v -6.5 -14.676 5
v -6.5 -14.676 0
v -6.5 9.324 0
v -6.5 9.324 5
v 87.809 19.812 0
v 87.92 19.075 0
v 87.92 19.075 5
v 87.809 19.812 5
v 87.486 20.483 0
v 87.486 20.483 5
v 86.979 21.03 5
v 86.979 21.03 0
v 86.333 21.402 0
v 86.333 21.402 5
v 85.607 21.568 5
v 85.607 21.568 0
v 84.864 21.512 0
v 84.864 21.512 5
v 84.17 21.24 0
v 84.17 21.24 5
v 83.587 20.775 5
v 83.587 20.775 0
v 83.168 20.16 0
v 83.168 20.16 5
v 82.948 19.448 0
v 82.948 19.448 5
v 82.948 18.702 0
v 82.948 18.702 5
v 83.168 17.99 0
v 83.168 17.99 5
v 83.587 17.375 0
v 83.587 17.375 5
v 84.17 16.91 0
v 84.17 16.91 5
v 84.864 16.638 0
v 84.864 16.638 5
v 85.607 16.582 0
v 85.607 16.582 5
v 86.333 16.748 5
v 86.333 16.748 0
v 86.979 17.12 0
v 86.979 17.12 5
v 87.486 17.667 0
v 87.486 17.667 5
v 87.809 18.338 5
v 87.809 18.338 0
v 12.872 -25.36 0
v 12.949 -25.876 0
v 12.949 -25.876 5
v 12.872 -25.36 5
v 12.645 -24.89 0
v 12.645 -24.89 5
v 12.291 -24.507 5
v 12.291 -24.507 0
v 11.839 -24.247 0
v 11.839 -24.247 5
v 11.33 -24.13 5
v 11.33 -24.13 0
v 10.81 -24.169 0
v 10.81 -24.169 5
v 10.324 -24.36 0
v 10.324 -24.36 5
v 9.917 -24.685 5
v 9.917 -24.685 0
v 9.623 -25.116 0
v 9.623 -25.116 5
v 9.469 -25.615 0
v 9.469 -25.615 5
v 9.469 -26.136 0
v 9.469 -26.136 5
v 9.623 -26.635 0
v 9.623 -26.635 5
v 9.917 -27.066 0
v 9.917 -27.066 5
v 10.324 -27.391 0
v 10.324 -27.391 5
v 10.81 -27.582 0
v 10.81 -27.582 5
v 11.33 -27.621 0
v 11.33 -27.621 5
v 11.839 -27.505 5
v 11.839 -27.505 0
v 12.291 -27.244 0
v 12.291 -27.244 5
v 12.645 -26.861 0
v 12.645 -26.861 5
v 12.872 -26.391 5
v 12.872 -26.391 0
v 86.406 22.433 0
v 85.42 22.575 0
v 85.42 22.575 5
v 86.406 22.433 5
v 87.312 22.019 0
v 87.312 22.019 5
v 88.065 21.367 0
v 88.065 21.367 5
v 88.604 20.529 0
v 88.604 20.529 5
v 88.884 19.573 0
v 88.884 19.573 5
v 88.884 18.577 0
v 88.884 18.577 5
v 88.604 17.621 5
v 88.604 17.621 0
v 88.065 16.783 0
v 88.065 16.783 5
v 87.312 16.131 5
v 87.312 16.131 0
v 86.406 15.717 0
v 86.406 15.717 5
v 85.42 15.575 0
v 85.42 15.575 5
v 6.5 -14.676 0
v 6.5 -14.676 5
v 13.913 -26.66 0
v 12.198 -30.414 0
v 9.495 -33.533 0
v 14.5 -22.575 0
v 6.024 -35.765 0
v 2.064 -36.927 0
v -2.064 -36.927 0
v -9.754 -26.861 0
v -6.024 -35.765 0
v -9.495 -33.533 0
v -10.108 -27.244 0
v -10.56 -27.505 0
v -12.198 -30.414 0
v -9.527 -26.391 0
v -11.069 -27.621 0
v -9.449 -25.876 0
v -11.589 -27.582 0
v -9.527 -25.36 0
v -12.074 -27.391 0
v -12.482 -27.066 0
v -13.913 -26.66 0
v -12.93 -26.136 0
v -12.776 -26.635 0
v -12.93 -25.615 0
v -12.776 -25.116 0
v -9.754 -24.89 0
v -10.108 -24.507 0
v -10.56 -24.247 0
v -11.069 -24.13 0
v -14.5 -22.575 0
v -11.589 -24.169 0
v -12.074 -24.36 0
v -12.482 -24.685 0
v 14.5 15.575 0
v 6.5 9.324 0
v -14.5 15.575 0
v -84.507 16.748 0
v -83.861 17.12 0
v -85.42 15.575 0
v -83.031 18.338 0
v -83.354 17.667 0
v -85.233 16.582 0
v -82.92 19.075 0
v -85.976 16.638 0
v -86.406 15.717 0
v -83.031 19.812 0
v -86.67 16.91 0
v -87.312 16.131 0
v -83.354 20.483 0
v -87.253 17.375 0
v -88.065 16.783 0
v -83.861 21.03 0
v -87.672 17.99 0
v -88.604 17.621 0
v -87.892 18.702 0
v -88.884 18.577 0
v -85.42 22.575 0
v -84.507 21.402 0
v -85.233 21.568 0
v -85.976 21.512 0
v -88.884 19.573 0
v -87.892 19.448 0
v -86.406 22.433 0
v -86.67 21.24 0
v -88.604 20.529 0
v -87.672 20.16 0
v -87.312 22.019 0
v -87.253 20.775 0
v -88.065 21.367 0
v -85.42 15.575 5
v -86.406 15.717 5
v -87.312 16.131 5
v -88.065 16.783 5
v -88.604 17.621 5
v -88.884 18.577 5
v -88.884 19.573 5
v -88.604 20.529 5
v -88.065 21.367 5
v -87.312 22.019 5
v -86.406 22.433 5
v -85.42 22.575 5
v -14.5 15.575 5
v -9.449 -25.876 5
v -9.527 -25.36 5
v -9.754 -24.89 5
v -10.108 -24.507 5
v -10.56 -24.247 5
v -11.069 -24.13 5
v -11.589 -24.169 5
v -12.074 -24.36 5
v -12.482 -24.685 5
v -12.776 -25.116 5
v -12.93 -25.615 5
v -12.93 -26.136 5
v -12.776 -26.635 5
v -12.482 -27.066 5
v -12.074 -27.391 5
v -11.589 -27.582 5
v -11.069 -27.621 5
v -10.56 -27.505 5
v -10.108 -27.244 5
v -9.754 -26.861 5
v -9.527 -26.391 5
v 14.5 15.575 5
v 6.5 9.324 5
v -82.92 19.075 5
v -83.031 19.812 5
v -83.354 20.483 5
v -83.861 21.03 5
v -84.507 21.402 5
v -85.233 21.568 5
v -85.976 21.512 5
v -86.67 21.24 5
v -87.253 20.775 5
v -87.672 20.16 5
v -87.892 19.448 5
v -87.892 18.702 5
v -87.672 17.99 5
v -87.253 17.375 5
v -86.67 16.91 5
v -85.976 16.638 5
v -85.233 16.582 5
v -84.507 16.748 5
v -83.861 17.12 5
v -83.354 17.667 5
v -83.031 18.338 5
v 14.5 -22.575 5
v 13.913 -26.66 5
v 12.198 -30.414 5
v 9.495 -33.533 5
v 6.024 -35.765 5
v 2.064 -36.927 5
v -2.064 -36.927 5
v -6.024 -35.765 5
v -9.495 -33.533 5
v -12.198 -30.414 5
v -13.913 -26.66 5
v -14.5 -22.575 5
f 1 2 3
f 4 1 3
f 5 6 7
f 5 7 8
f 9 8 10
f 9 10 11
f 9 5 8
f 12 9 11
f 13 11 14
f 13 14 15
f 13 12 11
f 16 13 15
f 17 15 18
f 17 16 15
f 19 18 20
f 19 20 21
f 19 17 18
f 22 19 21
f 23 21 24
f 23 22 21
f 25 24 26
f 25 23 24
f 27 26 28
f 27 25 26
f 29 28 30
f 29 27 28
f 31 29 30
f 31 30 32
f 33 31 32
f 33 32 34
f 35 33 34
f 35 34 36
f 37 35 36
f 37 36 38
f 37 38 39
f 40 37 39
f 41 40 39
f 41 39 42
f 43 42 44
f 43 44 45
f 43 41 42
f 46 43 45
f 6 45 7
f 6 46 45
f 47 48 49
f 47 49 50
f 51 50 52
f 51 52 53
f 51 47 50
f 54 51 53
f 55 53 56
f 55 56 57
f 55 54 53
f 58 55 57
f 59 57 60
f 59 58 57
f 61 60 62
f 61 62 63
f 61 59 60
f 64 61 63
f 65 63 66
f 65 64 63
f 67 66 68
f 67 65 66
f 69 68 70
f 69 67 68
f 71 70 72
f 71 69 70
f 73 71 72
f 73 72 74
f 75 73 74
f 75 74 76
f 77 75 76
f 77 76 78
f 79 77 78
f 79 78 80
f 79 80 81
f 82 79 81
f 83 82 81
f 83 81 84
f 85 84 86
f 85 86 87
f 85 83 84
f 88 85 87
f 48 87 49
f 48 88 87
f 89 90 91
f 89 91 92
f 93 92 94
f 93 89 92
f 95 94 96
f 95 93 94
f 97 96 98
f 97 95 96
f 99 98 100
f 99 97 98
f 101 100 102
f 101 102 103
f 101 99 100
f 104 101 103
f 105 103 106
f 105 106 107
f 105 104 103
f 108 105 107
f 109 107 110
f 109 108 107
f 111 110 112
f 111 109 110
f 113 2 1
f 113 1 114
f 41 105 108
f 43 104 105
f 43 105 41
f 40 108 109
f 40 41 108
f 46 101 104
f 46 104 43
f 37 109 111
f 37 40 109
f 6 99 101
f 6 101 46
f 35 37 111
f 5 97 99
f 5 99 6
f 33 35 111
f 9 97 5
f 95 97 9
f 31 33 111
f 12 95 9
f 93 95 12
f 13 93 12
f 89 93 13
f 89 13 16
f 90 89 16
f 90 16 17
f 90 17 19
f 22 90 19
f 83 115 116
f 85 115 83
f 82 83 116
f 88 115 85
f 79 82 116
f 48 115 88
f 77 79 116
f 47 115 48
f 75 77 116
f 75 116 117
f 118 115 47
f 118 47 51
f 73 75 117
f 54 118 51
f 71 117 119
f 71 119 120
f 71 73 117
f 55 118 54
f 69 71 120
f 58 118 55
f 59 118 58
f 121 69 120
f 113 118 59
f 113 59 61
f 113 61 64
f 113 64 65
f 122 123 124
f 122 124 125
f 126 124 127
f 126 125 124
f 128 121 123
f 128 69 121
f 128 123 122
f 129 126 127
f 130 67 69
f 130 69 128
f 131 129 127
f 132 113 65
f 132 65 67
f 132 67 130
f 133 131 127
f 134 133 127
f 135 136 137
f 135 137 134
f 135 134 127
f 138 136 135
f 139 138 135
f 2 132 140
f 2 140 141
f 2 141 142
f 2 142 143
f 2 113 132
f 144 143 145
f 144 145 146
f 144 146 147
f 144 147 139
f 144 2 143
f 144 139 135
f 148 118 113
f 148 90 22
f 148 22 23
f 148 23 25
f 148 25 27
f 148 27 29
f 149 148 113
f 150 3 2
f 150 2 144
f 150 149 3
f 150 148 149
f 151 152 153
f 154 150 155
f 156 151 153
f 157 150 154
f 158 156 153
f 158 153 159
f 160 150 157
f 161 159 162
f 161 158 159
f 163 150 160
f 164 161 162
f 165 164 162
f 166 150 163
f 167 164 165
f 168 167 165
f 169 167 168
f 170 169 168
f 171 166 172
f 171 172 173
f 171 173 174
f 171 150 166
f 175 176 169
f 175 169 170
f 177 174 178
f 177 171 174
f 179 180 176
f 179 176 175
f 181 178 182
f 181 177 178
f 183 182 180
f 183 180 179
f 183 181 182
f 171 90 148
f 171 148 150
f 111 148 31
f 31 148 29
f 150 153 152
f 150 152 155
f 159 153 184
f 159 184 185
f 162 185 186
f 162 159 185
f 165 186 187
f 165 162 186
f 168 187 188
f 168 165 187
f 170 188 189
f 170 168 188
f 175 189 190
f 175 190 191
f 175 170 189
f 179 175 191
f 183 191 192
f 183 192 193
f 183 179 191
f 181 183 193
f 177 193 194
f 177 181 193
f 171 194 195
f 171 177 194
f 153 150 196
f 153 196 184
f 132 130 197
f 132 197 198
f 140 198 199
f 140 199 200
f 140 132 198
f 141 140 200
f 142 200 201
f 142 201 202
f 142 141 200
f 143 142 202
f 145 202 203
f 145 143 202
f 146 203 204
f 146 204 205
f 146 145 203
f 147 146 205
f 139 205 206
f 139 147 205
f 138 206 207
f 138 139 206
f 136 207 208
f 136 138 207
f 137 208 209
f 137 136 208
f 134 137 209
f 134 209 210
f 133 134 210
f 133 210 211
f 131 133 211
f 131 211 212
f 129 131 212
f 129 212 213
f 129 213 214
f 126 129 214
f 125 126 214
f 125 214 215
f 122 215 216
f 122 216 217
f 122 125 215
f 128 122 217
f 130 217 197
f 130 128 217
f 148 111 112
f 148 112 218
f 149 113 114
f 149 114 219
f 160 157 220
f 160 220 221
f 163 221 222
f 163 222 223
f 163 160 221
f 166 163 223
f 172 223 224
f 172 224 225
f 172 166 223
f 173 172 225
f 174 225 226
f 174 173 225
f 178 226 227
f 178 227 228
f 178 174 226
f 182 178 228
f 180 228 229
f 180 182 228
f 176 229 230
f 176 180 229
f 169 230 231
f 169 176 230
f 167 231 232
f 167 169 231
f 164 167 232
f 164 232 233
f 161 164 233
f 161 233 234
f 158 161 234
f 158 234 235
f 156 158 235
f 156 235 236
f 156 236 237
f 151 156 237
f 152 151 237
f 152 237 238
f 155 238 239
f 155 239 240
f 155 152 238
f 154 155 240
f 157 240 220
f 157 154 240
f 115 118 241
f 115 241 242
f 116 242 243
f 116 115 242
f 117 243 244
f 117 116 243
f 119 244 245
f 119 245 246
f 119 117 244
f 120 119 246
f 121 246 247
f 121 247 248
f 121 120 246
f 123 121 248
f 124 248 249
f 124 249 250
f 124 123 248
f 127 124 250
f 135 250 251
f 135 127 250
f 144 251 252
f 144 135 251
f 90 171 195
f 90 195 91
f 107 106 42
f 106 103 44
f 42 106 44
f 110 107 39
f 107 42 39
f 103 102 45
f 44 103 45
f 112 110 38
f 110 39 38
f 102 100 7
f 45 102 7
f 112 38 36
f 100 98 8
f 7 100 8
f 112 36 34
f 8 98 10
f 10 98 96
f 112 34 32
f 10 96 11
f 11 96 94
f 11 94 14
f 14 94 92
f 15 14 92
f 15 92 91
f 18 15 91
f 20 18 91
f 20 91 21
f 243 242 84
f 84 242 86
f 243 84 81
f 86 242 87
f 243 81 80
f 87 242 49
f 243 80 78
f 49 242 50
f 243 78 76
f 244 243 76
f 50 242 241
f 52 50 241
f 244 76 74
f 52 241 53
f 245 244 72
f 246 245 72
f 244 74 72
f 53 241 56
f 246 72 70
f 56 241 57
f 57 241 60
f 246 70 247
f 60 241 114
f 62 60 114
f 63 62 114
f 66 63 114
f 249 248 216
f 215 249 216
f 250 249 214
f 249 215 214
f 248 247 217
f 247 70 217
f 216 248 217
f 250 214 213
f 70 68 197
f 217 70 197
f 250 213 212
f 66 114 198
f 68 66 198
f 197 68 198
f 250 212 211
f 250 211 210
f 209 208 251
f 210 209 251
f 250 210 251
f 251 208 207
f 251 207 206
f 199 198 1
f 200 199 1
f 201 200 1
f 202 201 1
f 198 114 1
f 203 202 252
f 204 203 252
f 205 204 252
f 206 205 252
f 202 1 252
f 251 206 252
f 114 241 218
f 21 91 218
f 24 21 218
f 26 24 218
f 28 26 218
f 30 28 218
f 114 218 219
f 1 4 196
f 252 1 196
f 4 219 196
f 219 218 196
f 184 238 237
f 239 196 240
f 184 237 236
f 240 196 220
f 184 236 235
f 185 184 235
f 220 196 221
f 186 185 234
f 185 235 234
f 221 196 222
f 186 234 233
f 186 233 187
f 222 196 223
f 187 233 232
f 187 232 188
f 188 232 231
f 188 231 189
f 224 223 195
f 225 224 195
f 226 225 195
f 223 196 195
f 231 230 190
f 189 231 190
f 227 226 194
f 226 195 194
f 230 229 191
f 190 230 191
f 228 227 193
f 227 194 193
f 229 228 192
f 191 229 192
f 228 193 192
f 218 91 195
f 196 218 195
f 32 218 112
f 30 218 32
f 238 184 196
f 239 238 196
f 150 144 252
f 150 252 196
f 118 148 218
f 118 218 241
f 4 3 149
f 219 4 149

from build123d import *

# Parameters (mm, degrees)
SKETCH_1_R      = 2.5
SKETCH_1_R_2    = 1.75
SKETCH_1_W      = 13
SKETCH_1_H      = 24
EXTRUDE_1_DEPTH = 5


with BuildPart() as part:
    # 스케치1 → 보스-돌출1 (new body)
    with BuildSketch(Plane.XY):
        with BuildLine():
            Line((-85.42, 22.575), (85.42, 22.575))
            ThreePointArc((85.42, 22.575), (88.92, 19.075), (85.42, 15.575))
            Line((85.42, 15.575), (14.5, 15.575))
            Line((14.5, 15.575), (14.5, -22.575))
            ThreePointArc((14.5, -22.575), (0, -37.075), (-14.5, -22.575))
            Line((-14.5, -22.575), (-14.5, 15.575))
            Line((-14.5, 15.575), (-85.42, 15.575))
            ThreePointArc((-85.42, 15.575), (-88.92, 19.075), (-85.42, 22.575))
        make_face()
        with Locations((-85.42, 19.075)):
            Circle(SKETCH_1_R, mode=Mode.SUBTRACT)
        with Locations((85.42, 19.075)):
            Circle(SKETCH_1_R, mode=Mode.SUBTRACT)
        with Locations((-11.199423754, -25.875576246)):
            Circle(SKETCH_1_R_2, mode=Mode.SUBTRACT)
        with Locations((11.199423754, -25.875576246)):
            Circle(SKETCH_1_R_2, mode=Mode.SUBTRACT)
        with Locations((0, -2.676152492)):
            Rectangle(SKETCH_1_W, SKETCH_1_H, mode=Mode.SUBTRACT)
    extrude(amount=EXTRUDE_1_DEPTH)


solid = part.part
